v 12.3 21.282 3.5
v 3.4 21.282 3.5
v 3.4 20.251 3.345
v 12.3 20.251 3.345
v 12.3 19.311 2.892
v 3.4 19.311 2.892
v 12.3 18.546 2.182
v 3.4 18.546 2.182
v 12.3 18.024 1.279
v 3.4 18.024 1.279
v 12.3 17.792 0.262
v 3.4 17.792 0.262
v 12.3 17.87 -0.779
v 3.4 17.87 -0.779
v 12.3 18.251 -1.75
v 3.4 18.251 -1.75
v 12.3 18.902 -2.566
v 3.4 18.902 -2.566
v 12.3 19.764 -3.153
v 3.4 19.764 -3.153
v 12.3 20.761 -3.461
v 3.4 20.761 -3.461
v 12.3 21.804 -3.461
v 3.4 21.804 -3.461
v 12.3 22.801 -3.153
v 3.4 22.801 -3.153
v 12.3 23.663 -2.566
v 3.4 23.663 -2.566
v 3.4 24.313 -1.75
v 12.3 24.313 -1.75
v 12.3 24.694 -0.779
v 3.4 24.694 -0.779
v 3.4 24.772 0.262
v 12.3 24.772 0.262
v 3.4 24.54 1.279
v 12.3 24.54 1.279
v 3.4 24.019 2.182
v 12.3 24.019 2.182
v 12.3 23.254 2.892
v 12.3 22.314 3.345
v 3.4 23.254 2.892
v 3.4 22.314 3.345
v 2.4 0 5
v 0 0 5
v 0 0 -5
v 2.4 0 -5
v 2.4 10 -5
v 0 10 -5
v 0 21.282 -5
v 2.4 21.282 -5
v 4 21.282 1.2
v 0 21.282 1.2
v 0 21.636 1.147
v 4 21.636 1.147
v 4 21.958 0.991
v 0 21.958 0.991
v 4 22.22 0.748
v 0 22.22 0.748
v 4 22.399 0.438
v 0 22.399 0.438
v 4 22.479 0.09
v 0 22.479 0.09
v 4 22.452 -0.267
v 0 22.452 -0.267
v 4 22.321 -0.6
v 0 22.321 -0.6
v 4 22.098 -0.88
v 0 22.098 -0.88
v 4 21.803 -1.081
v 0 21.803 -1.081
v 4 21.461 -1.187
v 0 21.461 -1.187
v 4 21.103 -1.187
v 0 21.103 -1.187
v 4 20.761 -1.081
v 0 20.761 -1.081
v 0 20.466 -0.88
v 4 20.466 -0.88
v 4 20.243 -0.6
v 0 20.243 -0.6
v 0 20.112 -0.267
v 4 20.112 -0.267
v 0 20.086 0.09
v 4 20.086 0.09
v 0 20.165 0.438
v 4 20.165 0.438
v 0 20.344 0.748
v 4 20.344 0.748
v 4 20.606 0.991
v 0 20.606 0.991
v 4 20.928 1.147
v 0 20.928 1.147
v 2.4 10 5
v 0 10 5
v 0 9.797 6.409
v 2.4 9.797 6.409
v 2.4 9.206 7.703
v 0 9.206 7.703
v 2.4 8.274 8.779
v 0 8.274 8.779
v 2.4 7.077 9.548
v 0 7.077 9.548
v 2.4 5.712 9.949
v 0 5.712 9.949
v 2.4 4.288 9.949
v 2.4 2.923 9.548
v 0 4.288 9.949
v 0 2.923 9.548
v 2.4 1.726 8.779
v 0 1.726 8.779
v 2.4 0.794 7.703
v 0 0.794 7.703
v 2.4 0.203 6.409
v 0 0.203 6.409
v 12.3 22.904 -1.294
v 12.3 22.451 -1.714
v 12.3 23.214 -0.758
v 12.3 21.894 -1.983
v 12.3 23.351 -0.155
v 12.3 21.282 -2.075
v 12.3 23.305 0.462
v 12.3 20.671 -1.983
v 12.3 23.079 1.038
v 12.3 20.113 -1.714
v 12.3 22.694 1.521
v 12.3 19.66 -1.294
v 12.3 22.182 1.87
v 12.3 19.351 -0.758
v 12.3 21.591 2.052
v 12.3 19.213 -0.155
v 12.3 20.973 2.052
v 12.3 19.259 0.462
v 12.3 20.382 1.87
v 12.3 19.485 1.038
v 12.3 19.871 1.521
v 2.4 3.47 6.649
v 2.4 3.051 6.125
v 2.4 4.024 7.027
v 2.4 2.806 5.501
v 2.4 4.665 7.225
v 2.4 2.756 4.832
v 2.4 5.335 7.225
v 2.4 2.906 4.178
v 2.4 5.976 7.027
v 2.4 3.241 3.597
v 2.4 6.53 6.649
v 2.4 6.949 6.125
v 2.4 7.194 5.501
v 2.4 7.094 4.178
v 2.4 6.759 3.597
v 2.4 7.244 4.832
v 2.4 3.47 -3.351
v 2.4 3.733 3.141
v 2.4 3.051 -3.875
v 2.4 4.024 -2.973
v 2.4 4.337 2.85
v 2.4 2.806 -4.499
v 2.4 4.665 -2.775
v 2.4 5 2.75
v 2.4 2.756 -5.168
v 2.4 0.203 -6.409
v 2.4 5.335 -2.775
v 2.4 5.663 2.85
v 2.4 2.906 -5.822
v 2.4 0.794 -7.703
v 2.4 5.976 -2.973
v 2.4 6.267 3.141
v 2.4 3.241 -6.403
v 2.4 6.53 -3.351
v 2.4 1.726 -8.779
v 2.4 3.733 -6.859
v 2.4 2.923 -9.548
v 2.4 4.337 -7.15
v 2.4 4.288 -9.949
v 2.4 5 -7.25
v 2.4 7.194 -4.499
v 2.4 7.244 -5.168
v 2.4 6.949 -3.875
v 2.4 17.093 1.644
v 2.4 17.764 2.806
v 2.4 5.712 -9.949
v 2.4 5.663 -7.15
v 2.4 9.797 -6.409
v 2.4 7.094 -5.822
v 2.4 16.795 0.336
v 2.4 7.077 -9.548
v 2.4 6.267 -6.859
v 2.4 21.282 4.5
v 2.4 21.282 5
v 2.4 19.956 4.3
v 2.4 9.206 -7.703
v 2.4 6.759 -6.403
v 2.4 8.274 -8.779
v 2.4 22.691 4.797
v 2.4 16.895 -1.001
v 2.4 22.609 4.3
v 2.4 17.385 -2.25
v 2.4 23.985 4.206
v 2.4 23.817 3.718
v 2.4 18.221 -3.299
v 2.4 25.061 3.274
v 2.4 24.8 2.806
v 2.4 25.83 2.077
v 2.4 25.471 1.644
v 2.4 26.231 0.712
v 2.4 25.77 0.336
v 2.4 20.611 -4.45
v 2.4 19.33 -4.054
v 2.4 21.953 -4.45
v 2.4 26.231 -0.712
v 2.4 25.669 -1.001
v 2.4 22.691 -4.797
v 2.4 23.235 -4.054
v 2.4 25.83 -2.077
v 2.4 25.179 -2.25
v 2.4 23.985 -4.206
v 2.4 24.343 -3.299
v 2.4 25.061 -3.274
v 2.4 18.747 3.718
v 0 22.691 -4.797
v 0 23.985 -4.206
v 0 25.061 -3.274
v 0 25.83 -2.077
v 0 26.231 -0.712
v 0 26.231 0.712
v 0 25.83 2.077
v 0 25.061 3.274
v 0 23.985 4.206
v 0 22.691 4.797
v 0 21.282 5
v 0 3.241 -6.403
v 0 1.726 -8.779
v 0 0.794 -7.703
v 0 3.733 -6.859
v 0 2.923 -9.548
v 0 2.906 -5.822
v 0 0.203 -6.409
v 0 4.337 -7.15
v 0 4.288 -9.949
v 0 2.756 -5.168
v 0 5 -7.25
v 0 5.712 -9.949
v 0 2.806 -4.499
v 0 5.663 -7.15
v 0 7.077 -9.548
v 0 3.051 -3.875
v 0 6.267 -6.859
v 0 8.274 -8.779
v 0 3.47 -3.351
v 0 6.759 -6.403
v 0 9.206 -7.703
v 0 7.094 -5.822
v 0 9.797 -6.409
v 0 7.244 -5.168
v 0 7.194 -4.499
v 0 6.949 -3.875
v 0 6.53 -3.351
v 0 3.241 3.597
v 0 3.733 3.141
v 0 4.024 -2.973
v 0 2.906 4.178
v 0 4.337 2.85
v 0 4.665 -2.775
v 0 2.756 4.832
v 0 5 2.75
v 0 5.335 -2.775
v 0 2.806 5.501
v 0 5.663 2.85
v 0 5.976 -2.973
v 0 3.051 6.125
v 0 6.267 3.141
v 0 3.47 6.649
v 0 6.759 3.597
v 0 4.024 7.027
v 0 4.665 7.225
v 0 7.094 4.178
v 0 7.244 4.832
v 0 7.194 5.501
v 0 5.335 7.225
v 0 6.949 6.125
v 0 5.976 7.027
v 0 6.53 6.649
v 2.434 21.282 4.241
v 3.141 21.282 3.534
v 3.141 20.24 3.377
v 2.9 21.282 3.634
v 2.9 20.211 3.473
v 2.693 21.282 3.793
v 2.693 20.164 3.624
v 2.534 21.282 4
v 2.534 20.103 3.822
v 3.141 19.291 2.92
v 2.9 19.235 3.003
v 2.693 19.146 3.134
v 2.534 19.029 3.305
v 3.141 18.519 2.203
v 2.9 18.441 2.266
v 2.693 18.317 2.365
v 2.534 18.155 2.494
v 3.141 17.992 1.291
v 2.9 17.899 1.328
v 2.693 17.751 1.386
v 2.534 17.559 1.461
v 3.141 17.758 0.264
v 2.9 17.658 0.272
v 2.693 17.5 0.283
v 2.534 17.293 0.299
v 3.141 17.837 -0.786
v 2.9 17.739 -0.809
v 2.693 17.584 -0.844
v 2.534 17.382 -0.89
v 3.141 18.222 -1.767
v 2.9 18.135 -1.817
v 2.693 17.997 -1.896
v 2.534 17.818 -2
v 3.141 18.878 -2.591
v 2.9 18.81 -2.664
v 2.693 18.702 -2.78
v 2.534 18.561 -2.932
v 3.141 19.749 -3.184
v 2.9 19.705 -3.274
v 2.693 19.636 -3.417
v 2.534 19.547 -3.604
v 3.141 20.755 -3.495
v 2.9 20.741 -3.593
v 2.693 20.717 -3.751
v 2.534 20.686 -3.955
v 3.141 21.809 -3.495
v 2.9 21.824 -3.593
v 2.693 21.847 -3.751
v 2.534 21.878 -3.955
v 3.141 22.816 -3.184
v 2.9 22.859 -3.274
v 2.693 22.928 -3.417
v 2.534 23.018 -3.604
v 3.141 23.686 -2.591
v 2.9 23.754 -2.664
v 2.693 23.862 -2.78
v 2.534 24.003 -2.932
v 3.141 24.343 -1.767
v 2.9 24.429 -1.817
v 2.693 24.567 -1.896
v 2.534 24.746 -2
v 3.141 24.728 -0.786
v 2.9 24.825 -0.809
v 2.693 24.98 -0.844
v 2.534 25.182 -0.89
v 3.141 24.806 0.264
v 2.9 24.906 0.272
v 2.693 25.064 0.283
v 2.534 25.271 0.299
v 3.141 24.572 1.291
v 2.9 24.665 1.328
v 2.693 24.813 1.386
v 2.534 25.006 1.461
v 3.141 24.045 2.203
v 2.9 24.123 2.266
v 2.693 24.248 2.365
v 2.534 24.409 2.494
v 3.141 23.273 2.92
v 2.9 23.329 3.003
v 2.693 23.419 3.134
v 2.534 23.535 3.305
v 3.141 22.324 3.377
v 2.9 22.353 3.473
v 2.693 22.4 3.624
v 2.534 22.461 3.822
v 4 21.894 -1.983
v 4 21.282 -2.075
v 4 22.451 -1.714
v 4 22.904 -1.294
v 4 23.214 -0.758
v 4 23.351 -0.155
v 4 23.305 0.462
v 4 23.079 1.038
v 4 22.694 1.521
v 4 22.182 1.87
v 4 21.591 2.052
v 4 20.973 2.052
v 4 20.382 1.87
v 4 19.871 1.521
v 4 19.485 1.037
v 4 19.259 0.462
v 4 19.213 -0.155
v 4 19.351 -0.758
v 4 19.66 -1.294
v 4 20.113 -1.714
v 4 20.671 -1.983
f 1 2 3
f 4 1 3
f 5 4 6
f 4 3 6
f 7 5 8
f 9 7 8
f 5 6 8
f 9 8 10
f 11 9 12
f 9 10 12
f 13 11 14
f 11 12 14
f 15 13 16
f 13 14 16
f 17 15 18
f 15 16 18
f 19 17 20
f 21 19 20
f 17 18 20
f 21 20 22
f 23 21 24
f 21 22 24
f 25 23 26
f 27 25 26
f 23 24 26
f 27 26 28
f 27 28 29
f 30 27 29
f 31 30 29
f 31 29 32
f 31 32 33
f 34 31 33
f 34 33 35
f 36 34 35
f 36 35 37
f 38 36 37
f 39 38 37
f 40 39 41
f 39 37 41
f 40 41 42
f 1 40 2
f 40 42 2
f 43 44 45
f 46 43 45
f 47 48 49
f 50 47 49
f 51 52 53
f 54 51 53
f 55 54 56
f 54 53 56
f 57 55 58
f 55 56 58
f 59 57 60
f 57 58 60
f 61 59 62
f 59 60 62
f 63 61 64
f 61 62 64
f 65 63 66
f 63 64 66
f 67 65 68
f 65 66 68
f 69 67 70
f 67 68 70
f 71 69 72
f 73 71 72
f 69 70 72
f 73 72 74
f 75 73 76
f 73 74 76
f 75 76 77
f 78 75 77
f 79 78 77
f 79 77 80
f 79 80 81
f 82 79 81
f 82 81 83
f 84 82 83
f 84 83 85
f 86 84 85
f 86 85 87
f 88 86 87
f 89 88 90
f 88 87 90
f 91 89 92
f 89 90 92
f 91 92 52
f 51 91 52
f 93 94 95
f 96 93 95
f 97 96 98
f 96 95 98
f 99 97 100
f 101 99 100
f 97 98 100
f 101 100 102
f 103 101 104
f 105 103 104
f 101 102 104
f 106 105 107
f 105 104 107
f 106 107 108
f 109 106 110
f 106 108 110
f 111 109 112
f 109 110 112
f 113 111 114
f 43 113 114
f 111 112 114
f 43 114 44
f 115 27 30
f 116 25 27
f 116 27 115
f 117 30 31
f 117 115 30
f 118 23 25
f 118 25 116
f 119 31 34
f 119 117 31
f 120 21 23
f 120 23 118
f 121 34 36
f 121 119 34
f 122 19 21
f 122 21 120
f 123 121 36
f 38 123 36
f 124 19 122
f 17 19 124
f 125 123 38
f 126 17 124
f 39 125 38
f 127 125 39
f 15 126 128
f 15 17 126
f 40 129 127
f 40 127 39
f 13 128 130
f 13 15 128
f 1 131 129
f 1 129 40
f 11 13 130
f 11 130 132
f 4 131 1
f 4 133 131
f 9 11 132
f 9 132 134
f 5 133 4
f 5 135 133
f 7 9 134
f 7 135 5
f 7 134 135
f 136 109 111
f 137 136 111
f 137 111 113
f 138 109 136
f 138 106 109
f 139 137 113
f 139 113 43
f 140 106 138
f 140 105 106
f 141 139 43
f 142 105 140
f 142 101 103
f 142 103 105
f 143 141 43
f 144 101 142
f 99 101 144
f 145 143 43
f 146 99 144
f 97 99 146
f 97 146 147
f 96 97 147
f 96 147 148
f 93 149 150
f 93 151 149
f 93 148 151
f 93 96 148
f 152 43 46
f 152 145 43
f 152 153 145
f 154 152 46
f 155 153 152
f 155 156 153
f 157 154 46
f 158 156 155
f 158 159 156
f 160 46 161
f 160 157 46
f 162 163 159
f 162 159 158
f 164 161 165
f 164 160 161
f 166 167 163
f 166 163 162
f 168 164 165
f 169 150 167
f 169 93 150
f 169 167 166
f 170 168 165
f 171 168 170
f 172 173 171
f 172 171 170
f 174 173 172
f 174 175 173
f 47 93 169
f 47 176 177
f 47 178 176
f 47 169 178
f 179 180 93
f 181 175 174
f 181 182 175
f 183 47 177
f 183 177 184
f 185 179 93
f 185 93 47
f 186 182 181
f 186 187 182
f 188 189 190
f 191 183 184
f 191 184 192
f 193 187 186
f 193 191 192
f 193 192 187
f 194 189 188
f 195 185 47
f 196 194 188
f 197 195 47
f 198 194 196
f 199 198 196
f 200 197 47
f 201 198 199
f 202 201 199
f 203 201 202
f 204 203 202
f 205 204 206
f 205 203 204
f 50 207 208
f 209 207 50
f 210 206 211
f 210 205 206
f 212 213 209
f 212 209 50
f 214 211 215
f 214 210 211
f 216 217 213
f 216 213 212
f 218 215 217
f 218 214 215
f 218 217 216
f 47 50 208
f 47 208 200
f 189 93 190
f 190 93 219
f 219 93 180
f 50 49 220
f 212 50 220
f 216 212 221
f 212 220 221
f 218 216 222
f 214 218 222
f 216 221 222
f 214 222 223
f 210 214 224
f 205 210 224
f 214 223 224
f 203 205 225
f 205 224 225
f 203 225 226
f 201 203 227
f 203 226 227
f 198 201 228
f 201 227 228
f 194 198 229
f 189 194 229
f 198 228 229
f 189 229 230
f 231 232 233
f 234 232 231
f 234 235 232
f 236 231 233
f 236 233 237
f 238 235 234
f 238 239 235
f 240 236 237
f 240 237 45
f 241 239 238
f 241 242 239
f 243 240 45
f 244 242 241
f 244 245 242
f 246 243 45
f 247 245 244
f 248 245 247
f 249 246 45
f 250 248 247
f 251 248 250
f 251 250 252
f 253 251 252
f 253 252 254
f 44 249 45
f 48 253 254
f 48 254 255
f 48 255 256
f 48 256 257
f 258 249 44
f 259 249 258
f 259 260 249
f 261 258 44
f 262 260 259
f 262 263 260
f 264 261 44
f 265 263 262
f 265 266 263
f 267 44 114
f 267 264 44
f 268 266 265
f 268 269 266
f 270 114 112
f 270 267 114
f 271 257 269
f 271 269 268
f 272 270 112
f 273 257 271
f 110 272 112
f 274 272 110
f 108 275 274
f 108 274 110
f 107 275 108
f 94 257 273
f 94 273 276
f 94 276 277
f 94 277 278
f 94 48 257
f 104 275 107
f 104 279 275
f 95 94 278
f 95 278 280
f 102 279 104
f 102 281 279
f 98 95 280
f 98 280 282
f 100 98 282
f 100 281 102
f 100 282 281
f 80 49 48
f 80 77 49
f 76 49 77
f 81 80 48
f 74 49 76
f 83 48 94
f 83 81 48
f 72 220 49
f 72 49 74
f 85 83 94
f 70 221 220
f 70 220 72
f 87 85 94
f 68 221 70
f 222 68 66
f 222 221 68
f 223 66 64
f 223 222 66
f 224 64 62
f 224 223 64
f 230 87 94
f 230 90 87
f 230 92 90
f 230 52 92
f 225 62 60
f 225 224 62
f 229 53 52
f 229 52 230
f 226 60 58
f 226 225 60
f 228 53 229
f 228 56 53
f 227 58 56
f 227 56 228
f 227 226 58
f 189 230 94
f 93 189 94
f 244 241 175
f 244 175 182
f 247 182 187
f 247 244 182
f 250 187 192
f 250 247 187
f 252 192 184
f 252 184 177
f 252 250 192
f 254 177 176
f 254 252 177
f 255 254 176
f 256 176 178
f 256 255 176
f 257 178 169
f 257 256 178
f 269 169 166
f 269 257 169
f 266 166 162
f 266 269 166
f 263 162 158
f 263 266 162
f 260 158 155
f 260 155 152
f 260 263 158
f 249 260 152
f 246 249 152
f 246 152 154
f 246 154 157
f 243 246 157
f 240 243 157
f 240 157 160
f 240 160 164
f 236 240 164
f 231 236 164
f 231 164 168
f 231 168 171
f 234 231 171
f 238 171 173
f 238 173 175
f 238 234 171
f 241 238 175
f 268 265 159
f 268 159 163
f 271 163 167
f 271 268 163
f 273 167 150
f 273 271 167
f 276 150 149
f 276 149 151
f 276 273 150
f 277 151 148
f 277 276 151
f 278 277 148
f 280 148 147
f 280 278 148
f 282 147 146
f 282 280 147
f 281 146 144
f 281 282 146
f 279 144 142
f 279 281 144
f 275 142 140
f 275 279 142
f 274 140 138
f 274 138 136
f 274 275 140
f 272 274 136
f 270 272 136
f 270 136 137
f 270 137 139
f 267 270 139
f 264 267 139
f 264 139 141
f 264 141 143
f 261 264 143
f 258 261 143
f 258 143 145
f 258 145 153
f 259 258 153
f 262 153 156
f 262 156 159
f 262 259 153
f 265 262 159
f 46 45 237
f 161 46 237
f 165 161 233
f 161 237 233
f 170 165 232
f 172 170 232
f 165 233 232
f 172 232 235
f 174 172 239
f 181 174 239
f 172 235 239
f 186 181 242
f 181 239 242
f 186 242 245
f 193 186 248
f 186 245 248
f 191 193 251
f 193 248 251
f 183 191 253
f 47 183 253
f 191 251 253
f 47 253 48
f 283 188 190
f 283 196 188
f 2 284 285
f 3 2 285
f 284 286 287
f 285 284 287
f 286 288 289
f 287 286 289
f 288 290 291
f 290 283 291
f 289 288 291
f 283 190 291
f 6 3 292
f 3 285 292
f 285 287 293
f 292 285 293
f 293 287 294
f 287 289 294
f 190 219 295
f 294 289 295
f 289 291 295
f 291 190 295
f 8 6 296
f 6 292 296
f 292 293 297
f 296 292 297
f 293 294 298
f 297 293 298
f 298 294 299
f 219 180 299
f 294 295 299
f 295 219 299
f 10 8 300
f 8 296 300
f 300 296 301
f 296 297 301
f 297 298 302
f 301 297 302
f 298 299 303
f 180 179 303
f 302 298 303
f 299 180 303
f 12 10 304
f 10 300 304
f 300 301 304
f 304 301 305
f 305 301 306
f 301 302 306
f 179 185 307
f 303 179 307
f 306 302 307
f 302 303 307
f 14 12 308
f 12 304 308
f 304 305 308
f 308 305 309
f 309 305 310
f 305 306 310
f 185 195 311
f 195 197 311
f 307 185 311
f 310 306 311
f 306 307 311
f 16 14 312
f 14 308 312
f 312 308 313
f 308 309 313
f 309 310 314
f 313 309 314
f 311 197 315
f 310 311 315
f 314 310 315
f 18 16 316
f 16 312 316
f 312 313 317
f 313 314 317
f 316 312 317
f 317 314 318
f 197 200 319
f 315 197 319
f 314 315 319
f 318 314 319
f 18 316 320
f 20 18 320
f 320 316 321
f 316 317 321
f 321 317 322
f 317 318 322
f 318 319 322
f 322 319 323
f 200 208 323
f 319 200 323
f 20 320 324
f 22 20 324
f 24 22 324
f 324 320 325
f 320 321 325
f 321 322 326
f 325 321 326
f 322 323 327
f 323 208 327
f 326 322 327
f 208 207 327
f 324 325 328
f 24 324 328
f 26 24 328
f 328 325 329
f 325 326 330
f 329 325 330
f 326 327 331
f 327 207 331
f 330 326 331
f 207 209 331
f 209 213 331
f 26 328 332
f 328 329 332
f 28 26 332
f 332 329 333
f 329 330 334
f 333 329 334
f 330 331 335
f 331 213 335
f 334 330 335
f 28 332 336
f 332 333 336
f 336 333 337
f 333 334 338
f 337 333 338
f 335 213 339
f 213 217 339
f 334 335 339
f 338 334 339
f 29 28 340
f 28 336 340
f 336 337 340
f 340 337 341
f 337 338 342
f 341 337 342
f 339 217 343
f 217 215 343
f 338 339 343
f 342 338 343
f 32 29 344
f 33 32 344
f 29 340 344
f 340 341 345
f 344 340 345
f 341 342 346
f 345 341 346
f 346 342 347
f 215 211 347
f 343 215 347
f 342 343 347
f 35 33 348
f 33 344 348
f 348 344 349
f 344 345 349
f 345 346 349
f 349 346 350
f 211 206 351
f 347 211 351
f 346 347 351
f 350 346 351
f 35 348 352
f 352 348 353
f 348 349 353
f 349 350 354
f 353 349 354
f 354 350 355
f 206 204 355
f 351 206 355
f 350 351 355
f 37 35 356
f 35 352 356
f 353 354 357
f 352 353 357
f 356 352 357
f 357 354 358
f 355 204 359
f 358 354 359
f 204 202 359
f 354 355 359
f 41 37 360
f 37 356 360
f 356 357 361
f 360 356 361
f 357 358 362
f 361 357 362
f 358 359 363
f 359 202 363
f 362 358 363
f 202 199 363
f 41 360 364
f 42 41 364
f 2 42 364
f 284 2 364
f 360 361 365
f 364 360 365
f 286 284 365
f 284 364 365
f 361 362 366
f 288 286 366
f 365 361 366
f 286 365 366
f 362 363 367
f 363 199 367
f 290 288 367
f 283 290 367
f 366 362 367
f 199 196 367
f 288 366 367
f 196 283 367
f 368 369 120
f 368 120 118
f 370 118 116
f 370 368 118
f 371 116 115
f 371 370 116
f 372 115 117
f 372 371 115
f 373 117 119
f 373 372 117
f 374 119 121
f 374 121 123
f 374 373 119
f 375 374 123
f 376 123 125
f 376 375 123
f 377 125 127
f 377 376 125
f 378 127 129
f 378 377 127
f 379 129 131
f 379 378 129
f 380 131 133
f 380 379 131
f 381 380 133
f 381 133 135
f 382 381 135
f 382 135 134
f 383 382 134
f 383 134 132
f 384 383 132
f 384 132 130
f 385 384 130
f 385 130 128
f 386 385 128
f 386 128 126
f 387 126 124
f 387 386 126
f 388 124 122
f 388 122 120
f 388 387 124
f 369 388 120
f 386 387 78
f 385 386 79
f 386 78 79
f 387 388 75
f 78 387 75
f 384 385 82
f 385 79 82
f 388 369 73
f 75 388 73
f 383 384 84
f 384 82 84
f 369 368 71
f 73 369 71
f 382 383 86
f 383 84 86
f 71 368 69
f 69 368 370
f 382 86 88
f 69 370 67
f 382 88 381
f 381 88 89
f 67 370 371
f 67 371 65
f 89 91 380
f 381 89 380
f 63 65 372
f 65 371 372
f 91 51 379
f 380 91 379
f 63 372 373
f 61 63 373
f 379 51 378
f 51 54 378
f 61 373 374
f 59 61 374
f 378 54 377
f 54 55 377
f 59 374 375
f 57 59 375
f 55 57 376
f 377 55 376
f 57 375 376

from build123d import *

# Parameters (mm, degrees)
SKETCH_1_R      = 2.25
SKETCH_1_R_2    = 2.075
EXTRUDE_1_DEPTH = 2.4
SKETCH_4_R      = 3.5
SKETCH_4_R_2    = 2.075
EXTRUDE_2_DEPTH = 9.9
FILLET_1_R      = 1
SKETCH_5_R      = 2.075
SKETCH_5_R_2    = 1.2
EXTRUDE_3_DEPTH = 4


with BuildPart() as part:
    # 草图1 → 凸台-拉伸1 (new body)
    with BuildSketch(Plane(origin=(0, 0, 0), x_dir=(0, 0, -1), z_dir=(1, 0, 0))):
        with BuildLine():
            Line((-5, 0), (5, 0))
            ThreePointArc((5, 0), (10, 5), (5, 10))
            Line((5, 10), (5, 21.282156306))
            ThreePointArc((5, 21.282156306), (0, 26.282156306), (-5, 21.282156306))
            Line((-5, 21.282156306), (-5, 10))
            ThreePointArc((-5, 10), (-10, 5), (-5, 0))
        make_face()
        with Locations((-5, 5)):
            Circle(SKETCH_1_R, mode=Mode.SUBTRACT)
        with Locations((5, 5)):
            Circle(SKETCH_1_R, mode=Mode.SUBTRACT)
        with Locations((0, 21.282156306)):
            Circle(SKETCH_1_R_2, mode=Mode.SUBTRACT)
    extrude(amount=EXTRUDE_1_DEPTH)

    # 草图4 → 凸台-拉伸2 (add)
    with BuildSketch(Plane(origin=(2.4, 0, 0), x_dir=(0, 0, -1), z_dir=(1, 0, 0))):
        with Locations(Location((0, 21.282156306, 0), (0, 0, 180))):
            Circle(SKETCH_4_R)
        with Locations((0, 21.282156306)):
            Circle(SKETCH_4_R_2, mode=Mode.SUBTRACT)
    extrude(amount=EXTRUDE_2_DEPTH)

    # 圆角1
    fillet_1_edges = [part.edges().sort_by_distance(p)[0] for p in [
        (2.4, 21.282156306, -3.5),
    ]]
    fillet(fillet_1_edges, radius=FILLET_1_R)

    # 草图5 → 凸台-拉伸3 (add)
    with BuildSketch(Plane.ZY):
        with Locations((0, 21.282156306)):
            Circle(SKETCH_5_R)
        with Locations((0, 21.282156306)):
            Circle(SKETCH_5_R_2, mode=Mode.SUBTRACT)
    extrude(amount=-EXTRUDE_3_DEPTH)


solid = part.part
